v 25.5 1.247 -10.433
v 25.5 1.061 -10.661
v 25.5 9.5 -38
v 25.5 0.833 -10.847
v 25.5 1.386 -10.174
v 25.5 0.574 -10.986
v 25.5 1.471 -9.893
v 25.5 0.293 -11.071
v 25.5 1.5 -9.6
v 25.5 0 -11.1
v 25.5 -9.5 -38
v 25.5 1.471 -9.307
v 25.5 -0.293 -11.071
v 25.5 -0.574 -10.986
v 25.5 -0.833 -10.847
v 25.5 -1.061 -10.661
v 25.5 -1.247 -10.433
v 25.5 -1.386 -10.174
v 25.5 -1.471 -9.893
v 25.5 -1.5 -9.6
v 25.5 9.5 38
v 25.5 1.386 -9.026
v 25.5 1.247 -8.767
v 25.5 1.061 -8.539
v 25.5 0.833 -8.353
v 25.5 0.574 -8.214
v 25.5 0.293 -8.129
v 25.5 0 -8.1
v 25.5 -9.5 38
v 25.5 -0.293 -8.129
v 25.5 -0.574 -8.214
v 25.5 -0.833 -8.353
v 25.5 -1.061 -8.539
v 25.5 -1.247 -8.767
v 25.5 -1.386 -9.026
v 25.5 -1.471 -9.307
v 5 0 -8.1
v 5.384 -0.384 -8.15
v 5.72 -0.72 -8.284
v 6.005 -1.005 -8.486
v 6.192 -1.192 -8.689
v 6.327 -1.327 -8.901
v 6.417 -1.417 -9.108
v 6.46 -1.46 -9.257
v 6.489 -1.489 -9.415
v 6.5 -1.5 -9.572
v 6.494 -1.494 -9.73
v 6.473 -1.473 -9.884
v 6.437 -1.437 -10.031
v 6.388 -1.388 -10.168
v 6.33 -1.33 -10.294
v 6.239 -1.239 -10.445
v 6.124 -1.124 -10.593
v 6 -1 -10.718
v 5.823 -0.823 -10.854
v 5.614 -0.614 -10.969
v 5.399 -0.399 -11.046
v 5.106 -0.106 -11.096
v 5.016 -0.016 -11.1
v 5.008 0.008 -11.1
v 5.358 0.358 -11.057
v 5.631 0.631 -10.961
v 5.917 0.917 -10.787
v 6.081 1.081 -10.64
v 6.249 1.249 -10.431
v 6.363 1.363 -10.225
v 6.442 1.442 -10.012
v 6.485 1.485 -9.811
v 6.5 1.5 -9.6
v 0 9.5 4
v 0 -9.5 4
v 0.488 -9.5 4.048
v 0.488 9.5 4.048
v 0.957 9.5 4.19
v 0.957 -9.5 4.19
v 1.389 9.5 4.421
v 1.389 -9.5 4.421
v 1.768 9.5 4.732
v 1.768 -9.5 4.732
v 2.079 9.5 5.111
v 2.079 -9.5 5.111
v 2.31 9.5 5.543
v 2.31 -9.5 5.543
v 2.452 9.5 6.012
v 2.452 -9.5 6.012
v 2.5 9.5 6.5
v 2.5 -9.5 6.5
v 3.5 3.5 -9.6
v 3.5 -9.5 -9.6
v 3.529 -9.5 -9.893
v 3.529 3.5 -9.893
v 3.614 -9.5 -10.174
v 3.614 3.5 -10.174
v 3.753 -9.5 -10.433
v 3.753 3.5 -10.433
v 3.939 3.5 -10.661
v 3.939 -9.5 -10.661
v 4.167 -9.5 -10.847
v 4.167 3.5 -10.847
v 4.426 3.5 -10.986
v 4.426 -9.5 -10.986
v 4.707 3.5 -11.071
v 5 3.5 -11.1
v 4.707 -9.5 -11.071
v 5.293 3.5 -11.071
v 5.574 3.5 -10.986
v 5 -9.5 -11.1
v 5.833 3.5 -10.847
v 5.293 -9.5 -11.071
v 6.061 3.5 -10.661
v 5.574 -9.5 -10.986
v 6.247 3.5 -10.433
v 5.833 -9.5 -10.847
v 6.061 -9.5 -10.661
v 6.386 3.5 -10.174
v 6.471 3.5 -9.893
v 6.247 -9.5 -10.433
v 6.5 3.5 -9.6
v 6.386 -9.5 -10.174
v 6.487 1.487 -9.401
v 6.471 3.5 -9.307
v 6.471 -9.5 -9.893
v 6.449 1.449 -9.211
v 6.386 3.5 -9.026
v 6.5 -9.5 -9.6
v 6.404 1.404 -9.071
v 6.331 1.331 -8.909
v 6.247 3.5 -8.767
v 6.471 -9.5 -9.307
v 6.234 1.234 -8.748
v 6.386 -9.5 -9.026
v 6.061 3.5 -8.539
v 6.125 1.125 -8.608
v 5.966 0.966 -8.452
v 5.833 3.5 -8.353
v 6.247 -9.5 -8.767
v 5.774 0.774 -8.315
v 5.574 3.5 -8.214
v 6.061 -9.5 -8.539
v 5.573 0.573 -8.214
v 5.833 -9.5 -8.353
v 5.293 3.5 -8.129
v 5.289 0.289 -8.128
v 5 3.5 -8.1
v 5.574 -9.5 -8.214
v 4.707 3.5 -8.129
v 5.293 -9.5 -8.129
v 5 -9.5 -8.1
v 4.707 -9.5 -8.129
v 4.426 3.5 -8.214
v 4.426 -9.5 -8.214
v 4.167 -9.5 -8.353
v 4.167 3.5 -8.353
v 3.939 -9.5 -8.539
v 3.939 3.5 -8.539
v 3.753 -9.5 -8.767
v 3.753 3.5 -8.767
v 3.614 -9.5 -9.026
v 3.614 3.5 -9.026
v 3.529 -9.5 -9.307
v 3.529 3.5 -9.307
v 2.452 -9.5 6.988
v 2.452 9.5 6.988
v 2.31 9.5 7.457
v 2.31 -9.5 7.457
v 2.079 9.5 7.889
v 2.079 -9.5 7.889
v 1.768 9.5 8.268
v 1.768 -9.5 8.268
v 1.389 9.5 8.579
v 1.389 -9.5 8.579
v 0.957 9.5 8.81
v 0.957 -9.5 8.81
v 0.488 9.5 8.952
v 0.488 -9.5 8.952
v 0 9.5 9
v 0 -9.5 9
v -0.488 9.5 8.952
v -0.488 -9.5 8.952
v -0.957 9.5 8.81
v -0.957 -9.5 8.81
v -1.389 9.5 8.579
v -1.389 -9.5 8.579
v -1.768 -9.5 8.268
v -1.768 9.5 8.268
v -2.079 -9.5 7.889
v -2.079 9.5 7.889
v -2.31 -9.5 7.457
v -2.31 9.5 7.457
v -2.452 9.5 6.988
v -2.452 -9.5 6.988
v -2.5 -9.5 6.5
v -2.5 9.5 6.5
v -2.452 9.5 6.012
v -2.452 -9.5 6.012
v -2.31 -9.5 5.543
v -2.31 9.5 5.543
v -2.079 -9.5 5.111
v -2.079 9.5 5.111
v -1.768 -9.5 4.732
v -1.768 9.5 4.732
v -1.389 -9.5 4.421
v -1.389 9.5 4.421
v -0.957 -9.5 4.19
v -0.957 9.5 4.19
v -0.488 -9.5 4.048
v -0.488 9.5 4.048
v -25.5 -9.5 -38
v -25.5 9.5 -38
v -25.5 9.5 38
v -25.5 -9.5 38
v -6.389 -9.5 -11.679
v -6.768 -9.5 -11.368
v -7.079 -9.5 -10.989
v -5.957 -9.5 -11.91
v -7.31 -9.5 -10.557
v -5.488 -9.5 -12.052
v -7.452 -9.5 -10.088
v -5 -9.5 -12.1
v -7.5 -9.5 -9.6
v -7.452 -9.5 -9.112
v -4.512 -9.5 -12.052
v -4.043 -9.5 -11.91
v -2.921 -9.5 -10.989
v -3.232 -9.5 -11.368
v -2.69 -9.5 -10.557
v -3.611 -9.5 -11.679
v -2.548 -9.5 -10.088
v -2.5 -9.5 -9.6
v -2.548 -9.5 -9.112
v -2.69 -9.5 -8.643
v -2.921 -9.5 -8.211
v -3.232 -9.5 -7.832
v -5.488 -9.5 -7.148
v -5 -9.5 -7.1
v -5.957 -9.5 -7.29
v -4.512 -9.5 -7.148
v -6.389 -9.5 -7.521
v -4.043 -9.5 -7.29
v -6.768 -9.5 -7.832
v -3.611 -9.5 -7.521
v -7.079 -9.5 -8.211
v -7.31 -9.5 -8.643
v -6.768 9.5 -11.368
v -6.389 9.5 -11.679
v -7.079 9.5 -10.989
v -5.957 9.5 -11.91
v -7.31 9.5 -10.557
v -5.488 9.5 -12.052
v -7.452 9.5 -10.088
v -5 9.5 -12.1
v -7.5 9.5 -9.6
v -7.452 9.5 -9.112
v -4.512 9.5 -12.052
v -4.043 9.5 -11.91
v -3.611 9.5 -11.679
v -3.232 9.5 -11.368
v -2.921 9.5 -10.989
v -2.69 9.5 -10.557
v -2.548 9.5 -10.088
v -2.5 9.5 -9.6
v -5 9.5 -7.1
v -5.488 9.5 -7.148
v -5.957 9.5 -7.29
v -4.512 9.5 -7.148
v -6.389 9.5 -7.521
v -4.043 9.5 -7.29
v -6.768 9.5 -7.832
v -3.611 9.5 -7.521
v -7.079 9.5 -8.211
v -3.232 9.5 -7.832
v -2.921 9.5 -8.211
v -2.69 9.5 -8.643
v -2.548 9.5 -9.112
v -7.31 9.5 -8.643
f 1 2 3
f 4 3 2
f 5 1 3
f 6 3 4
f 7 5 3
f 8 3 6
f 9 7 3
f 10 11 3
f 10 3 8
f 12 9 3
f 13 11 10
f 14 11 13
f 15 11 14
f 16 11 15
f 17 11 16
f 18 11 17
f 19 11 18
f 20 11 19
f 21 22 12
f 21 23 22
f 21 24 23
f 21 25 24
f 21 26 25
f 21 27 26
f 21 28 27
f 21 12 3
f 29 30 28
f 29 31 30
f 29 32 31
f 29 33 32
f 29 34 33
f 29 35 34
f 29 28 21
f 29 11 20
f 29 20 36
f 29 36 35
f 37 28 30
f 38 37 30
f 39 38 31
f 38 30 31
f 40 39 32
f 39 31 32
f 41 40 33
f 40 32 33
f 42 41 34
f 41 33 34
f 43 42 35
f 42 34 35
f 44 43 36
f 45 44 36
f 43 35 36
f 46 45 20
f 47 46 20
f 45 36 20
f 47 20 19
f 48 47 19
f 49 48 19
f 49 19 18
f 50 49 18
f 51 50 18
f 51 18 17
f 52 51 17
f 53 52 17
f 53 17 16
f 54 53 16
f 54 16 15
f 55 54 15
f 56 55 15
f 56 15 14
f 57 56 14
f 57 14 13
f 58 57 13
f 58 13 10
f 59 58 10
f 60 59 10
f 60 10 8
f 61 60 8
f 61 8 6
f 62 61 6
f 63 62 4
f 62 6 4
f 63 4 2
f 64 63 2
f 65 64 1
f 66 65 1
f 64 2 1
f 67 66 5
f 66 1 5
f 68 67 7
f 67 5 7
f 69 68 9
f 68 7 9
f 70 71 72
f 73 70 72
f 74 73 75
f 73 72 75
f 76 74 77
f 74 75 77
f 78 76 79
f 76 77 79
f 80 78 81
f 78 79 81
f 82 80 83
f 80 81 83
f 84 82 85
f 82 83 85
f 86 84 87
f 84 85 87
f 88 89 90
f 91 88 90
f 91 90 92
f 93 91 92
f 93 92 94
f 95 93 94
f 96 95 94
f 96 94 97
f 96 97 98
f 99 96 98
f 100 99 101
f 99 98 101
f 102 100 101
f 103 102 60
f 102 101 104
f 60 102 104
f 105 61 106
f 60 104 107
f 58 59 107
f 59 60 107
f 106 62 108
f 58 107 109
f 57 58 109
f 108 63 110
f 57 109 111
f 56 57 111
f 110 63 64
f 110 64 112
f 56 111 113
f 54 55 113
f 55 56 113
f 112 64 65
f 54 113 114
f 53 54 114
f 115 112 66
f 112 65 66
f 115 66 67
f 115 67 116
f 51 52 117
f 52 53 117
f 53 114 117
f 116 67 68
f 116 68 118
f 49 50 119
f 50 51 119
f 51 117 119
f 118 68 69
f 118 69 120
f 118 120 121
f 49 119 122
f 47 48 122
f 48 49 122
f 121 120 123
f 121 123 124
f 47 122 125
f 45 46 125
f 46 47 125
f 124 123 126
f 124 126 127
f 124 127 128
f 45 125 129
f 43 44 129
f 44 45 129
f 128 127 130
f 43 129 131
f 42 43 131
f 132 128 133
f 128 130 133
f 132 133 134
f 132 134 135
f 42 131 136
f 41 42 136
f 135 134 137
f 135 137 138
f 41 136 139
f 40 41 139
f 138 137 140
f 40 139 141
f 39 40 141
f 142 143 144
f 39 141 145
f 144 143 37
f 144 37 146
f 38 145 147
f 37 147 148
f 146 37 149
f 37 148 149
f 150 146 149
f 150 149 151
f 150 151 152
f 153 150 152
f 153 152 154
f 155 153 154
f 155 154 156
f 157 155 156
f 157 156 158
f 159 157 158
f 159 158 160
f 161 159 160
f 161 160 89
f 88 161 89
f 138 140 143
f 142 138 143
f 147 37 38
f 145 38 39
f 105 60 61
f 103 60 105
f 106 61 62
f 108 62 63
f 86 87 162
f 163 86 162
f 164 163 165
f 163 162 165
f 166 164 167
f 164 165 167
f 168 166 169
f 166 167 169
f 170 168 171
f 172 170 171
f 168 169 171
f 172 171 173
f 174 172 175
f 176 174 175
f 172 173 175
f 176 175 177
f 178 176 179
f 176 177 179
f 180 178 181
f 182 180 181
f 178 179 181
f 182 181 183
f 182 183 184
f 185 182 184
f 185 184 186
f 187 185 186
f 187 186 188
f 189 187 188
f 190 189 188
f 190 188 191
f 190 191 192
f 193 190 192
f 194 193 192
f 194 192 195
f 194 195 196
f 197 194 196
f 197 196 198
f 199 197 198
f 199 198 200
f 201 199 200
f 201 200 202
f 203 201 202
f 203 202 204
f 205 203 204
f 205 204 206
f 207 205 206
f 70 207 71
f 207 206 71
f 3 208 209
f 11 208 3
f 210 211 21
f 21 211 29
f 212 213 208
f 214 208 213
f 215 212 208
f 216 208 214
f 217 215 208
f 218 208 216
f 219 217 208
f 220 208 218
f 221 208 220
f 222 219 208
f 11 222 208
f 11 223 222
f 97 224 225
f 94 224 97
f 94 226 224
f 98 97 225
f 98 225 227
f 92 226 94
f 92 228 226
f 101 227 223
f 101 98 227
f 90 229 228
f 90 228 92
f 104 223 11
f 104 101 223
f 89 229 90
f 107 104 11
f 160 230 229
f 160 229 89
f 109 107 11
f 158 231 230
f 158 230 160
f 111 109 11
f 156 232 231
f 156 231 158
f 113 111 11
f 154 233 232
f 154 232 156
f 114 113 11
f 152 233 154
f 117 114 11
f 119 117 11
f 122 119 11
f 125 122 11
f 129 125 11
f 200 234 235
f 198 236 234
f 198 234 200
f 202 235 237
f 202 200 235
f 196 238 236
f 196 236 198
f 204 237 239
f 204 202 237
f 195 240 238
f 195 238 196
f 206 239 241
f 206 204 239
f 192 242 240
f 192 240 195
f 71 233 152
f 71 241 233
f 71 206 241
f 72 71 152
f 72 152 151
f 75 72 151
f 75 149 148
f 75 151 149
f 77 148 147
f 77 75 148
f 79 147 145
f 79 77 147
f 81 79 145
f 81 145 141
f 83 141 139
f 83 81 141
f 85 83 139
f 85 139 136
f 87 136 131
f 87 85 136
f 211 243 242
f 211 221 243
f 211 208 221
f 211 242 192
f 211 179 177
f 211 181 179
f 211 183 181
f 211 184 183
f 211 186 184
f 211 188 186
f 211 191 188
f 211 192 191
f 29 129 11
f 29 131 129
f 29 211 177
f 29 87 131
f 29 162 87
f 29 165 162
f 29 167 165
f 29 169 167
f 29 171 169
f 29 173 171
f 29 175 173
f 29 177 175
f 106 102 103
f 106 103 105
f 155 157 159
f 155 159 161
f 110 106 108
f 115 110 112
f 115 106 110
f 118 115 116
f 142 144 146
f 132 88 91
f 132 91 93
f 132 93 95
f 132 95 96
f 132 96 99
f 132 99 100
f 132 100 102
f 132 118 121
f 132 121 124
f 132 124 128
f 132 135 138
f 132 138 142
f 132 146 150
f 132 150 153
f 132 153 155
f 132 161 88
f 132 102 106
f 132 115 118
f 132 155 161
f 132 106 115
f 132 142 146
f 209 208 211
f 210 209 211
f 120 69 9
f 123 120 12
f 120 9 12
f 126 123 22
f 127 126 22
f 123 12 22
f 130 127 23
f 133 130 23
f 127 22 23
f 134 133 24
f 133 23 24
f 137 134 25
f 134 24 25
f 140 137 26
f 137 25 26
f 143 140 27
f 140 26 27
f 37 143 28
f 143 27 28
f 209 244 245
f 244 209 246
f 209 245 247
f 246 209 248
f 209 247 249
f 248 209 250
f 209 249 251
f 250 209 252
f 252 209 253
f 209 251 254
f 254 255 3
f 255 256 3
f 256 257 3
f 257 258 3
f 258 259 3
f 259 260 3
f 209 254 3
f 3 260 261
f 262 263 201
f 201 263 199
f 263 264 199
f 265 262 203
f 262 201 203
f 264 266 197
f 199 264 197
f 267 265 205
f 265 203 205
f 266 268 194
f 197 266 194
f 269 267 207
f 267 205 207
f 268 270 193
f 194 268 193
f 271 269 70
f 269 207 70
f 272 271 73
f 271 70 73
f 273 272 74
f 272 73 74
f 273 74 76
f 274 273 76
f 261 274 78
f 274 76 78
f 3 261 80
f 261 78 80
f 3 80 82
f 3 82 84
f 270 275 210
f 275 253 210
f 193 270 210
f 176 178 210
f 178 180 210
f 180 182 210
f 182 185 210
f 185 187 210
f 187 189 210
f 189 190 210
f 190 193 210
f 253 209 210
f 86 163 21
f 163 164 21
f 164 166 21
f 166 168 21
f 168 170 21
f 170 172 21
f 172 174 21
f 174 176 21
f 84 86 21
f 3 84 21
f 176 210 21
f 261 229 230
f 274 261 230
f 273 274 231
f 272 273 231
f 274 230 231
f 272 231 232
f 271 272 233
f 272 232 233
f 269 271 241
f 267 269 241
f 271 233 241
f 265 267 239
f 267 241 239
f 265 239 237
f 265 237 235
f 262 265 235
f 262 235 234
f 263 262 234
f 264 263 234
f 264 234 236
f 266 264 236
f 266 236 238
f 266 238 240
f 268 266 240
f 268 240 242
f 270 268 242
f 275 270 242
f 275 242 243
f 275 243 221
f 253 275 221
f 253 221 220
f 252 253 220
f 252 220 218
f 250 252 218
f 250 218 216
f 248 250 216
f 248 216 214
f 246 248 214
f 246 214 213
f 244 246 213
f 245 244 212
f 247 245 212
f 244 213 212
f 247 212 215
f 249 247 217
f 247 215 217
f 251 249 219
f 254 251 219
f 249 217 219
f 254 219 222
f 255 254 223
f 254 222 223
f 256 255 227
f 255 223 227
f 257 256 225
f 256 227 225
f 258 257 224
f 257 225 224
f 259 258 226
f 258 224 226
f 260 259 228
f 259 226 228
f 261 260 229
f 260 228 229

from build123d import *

# Parameters (mm, degrees)
F0_W     = 51
F0_H     = 76
F1_DEPTH = 9.5
F3_DEPTH = 19.001
F2_R     = 2.5
F4_DEPTH = 19.001
F5_DEPTH = 13
F7_DEPTH = 20.5


with BuildPart() as f1:
    # F0 (on Front) → F1 (new body, symmetric)
    with BuildSketch(Plane.XZ):
        Rectangle(F0_W, F0_H)
    extrude(amount=F1_DEPTH, both=True)

    # F2 (on face) → F3 (cut, through all)
    with BuildSketch(Plane.XZ.offset(9.5)):
        with BuildLine():
            ThreePointArc((2.5, 6.5), (-1.767767, 8.267767), (0, 4))
            ThreePointArc((0, 4), (1.767767, 4.732233), (2.5, 6.5))
        make_face()
    extrude(amount=-F3_DEPTH, mode=Mode.SUBTRACT)

    # F2 (on face) → F4 (cut, through all)
    with BuildSketch(Plane.XZ.offset(9.5)):
        with Locations((-5, -9.6)):
            Circle(F2_R)
    extrude(amount=-F4_DEPTH, mode=Mode.SUBTRACT)

    # F2 (on face) → F5 (cut)
    with BuildSketch(Plane.XZ.offset(9.5)):
        with BuildLine():
            ThreePointArc((6.5, -9.6), (5, -8.1), (3.5, -9.6))
            ThreePointArc((3.5, -9.6), (5, -11.1), (6.5, -9.6))
        make_face()
    extrude(amount=-F5_DEPTH, mode=Mode.SUBTRACT)

    # F6 (on face) → F7 (cut)
    with BuildSketch(Plane.YZ.offset(25.5)):
        with BuildLine():
            ThreePointArc((0, -8.1), (-1.06066, -10.66066), (1.5, -9.6))
            ThreePointArc((1.5, -9.6), (1.06066, -8.53934), (0, -8.1))
        make_face()
    extrude(amount=-F7_DEPTH, mode=Mode.SUBTRACT)


solid = f1.part
